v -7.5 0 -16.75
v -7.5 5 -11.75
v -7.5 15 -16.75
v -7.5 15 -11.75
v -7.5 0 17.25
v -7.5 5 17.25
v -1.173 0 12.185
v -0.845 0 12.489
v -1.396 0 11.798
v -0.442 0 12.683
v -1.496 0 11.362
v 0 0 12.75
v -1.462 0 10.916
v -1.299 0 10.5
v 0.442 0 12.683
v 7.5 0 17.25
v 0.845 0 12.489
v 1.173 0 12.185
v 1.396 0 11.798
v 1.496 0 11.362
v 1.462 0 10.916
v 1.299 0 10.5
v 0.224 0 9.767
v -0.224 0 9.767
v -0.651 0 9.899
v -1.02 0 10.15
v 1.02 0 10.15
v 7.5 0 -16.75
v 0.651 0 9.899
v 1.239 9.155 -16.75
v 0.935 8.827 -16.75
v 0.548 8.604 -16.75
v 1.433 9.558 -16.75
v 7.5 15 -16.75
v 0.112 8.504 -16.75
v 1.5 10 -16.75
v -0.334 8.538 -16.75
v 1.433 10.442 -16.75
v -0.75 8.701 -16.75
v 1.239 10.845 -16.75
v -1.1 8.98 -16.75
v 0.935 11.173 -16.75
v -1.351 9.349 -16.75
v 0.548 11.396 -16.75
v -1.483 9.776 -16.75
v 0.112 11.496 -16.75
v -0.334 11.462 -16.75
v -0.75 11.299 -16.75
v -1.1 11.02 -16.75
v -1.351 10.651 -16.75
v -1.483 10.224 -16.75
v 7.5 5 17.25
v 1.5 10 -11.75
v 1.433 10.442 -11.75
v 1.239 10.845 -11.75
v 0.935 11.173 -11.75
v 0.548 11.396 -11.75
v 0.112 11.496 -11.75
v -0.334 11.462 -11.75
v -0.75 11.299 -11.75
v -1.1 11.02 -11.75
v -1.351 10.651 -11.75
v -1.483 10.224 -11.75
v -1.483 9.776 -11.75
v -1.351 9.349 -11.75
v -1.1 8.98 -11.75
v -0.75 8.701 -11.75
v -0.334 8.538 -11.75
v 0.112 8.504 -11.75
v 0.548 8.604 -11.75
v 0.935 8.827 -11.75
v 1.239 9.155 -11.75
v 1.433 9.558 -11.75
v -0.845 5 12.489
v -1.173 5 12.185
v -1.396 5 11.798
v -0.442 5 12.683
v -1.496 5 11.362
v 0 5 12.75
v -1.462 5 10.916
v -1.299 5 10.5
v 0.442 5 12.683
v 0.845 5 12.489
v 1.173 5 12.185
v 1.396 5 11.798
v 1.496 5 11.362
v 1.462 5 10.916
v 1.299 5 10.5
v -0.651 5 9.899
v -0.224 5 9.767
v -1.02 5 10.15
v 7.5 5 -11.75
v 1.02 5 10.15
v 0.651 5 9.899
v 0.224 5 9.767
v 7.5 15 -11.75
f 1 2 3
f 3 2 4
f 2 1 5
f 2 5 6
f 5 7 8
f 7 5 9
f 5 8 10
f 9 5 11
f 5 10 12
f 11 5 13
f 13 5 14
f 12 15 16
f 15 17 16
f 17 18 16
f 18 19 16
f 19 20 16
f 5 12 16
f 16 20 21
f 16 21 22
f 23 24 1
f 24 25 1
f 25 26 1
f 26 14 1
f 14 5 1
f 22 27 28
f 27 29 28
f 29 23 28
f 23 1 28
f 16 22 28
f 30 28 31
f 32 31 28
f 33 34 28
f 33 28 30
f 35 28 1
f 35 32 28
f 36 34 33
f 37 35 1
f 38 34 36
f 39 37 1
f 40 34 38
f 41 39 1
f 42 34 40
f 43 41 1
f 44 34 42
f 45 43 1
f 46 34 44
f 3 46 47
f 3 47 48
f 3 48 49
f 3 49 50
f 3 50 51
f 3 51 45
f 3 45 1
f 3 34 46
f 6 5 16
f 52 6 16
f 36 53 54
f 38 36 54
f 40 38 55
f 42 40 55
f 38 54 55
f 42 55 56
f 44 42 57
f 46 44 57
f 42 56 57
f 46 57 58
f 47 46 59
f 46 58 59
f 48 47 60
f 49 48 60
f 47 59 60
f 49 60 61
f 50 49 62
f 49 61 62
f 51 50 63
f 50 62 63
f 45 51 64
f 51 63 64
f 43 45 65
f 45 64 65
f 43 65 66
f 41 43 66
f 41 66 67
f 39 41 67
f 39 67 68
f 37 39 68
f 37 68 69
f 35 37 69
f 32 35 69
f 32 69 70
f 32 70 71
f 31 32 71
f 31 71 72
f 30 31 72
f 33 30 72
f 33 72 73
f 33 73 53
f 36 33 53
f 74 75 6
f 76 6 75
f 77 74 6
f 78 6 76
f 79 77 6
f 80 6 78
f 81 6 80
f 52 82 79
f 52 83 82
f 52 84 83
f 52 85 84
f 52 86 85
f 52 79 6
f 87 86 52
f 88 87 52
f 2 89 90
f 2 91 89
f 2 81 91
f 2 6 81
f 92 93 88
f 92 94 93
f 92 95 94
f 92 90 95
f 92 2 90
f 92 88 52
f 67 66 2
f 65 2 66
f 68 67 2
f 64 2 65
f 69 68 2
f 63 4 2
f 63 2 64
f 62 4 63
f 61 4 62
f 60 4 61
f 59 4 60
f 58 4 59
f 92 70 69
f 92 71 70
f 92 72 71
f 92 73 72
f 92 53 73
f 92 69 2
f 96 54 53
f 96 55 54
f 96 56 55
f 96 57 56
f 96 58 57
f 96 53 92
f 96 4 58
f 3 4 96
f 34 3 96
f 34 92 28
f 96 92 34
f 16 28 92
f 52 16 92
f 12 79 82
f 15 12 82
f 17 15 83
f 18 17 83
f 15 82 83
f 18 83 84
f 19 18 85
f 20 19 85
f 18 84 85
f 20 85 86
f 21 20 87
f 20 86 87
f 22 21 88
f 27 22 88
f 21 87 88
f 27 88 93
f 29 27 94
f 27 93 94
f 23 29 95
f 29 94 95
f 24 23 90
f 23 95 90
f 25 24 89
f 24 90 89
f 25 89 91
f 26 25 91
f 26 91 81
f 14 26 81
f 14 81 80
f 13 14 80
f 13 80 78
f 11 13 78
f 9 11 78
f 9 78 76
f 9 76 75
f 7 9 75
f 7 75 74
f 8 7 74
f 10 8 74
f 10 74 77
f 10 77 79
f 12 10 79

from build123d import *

# Parameters (mm, degrees)
SKETCH1_W      = 15
SKETCH1_H      = 34.5
EXTRUDE1_DEPTH = 5
SKETCH2_W      = 15
SKETCH2_H      = 5
EXTRUDE2_DEPTH = 10
SKETCH3_R      = 1.5
EXTRUDE3_DEPTH = 10
SKETCH4_R      = 1.5
EXTRUDE4_DEPTH = 10
SKETCH5_W      = 15
SKETCH5_H      = 15
EXTRUDE5_DEPTH = 0.5
EXTRUDE6_START = 0.5
SKETCH6_W      = 15
SKETCH6_H      = 10
SKETCH6_R      = 1.5
EXTRUDE6_DEPTH = 0.5


with BuildPart() as part:
    # Sketch1 → Extrude1 (new body)
    with BuildSketch(Plane(origin=(0, 0, 0), x_dir=(1, 0, 0), z_dir=(0, 1, 0))):
        Rectangle(SKETCH1_W, SKETCH1_H)
    extrude(amount=EXTRUDE1_DEPTH)

    # Sketch2 → Extrude2 (add)
    with BuildSketch(Plane(origin=(0, 5, 0), x_dir=(1, 0, 0), z_dir=(0, 1, 0))):
        with Locations((0, 14.75)):
            Rectangle(SKETCH2_W, SKETCH2_H)
    extrude(amount=EXTRUDE2_DEPTH)

    # Sketch3 → Extrude3 (cut)
    with BuildSketch(Plane(origin=(0, 5, 0), x_dir=(1, 0, 0), z_dir=(0, 1, 0))):
        with Locations(Location((0, -11.25, 0), (0, 0, 270))):
            Circle(SKETCH3_R)
    extrude(amount=-EXTRUDE3_DEPTH, mode=Mode.SUBTRACT)

    # Sketch4 → Extrude4 (cut)
    with BuildSketch(Plane.XY.offset(-12.25)):
        with Locations((0, 10)):
            Circle(SKETCH4_R)
    extrude(amount=-EXTRUDE4_DEPTH, mode=Mode.SUBTRACT)

    # Sketch5 → Extrude5 (cut)
    with BuildSketch(Plane(origin=(0, 0, -17.25), x_dir=(-1, 0, 0), z_dir=(0, 0, -1))):
        with Locations((0, 7.5)):
            Rectangle(SKETCH5_W, SKETCH5_H)
    extrude(amount=-EXTRUDE5_DEPTH, mode=Mode.SUBTRACT)

    # Sketch6 → Extrude6 (add)
    with BuildSketch(Plane.XY.offset(-12.25).offset(EXTRUDE6_START)):
        with Locations((0, 10)):
            Rectangle(SKETCH6_W, SKETCH6_H)
        with Locations((0, 10)):
            Circle(SKETCH6_R, mode=Mode.SUBTRACT)
    extrude(amount=-EXTRUDE6_DEPTH)


solid = part.part
